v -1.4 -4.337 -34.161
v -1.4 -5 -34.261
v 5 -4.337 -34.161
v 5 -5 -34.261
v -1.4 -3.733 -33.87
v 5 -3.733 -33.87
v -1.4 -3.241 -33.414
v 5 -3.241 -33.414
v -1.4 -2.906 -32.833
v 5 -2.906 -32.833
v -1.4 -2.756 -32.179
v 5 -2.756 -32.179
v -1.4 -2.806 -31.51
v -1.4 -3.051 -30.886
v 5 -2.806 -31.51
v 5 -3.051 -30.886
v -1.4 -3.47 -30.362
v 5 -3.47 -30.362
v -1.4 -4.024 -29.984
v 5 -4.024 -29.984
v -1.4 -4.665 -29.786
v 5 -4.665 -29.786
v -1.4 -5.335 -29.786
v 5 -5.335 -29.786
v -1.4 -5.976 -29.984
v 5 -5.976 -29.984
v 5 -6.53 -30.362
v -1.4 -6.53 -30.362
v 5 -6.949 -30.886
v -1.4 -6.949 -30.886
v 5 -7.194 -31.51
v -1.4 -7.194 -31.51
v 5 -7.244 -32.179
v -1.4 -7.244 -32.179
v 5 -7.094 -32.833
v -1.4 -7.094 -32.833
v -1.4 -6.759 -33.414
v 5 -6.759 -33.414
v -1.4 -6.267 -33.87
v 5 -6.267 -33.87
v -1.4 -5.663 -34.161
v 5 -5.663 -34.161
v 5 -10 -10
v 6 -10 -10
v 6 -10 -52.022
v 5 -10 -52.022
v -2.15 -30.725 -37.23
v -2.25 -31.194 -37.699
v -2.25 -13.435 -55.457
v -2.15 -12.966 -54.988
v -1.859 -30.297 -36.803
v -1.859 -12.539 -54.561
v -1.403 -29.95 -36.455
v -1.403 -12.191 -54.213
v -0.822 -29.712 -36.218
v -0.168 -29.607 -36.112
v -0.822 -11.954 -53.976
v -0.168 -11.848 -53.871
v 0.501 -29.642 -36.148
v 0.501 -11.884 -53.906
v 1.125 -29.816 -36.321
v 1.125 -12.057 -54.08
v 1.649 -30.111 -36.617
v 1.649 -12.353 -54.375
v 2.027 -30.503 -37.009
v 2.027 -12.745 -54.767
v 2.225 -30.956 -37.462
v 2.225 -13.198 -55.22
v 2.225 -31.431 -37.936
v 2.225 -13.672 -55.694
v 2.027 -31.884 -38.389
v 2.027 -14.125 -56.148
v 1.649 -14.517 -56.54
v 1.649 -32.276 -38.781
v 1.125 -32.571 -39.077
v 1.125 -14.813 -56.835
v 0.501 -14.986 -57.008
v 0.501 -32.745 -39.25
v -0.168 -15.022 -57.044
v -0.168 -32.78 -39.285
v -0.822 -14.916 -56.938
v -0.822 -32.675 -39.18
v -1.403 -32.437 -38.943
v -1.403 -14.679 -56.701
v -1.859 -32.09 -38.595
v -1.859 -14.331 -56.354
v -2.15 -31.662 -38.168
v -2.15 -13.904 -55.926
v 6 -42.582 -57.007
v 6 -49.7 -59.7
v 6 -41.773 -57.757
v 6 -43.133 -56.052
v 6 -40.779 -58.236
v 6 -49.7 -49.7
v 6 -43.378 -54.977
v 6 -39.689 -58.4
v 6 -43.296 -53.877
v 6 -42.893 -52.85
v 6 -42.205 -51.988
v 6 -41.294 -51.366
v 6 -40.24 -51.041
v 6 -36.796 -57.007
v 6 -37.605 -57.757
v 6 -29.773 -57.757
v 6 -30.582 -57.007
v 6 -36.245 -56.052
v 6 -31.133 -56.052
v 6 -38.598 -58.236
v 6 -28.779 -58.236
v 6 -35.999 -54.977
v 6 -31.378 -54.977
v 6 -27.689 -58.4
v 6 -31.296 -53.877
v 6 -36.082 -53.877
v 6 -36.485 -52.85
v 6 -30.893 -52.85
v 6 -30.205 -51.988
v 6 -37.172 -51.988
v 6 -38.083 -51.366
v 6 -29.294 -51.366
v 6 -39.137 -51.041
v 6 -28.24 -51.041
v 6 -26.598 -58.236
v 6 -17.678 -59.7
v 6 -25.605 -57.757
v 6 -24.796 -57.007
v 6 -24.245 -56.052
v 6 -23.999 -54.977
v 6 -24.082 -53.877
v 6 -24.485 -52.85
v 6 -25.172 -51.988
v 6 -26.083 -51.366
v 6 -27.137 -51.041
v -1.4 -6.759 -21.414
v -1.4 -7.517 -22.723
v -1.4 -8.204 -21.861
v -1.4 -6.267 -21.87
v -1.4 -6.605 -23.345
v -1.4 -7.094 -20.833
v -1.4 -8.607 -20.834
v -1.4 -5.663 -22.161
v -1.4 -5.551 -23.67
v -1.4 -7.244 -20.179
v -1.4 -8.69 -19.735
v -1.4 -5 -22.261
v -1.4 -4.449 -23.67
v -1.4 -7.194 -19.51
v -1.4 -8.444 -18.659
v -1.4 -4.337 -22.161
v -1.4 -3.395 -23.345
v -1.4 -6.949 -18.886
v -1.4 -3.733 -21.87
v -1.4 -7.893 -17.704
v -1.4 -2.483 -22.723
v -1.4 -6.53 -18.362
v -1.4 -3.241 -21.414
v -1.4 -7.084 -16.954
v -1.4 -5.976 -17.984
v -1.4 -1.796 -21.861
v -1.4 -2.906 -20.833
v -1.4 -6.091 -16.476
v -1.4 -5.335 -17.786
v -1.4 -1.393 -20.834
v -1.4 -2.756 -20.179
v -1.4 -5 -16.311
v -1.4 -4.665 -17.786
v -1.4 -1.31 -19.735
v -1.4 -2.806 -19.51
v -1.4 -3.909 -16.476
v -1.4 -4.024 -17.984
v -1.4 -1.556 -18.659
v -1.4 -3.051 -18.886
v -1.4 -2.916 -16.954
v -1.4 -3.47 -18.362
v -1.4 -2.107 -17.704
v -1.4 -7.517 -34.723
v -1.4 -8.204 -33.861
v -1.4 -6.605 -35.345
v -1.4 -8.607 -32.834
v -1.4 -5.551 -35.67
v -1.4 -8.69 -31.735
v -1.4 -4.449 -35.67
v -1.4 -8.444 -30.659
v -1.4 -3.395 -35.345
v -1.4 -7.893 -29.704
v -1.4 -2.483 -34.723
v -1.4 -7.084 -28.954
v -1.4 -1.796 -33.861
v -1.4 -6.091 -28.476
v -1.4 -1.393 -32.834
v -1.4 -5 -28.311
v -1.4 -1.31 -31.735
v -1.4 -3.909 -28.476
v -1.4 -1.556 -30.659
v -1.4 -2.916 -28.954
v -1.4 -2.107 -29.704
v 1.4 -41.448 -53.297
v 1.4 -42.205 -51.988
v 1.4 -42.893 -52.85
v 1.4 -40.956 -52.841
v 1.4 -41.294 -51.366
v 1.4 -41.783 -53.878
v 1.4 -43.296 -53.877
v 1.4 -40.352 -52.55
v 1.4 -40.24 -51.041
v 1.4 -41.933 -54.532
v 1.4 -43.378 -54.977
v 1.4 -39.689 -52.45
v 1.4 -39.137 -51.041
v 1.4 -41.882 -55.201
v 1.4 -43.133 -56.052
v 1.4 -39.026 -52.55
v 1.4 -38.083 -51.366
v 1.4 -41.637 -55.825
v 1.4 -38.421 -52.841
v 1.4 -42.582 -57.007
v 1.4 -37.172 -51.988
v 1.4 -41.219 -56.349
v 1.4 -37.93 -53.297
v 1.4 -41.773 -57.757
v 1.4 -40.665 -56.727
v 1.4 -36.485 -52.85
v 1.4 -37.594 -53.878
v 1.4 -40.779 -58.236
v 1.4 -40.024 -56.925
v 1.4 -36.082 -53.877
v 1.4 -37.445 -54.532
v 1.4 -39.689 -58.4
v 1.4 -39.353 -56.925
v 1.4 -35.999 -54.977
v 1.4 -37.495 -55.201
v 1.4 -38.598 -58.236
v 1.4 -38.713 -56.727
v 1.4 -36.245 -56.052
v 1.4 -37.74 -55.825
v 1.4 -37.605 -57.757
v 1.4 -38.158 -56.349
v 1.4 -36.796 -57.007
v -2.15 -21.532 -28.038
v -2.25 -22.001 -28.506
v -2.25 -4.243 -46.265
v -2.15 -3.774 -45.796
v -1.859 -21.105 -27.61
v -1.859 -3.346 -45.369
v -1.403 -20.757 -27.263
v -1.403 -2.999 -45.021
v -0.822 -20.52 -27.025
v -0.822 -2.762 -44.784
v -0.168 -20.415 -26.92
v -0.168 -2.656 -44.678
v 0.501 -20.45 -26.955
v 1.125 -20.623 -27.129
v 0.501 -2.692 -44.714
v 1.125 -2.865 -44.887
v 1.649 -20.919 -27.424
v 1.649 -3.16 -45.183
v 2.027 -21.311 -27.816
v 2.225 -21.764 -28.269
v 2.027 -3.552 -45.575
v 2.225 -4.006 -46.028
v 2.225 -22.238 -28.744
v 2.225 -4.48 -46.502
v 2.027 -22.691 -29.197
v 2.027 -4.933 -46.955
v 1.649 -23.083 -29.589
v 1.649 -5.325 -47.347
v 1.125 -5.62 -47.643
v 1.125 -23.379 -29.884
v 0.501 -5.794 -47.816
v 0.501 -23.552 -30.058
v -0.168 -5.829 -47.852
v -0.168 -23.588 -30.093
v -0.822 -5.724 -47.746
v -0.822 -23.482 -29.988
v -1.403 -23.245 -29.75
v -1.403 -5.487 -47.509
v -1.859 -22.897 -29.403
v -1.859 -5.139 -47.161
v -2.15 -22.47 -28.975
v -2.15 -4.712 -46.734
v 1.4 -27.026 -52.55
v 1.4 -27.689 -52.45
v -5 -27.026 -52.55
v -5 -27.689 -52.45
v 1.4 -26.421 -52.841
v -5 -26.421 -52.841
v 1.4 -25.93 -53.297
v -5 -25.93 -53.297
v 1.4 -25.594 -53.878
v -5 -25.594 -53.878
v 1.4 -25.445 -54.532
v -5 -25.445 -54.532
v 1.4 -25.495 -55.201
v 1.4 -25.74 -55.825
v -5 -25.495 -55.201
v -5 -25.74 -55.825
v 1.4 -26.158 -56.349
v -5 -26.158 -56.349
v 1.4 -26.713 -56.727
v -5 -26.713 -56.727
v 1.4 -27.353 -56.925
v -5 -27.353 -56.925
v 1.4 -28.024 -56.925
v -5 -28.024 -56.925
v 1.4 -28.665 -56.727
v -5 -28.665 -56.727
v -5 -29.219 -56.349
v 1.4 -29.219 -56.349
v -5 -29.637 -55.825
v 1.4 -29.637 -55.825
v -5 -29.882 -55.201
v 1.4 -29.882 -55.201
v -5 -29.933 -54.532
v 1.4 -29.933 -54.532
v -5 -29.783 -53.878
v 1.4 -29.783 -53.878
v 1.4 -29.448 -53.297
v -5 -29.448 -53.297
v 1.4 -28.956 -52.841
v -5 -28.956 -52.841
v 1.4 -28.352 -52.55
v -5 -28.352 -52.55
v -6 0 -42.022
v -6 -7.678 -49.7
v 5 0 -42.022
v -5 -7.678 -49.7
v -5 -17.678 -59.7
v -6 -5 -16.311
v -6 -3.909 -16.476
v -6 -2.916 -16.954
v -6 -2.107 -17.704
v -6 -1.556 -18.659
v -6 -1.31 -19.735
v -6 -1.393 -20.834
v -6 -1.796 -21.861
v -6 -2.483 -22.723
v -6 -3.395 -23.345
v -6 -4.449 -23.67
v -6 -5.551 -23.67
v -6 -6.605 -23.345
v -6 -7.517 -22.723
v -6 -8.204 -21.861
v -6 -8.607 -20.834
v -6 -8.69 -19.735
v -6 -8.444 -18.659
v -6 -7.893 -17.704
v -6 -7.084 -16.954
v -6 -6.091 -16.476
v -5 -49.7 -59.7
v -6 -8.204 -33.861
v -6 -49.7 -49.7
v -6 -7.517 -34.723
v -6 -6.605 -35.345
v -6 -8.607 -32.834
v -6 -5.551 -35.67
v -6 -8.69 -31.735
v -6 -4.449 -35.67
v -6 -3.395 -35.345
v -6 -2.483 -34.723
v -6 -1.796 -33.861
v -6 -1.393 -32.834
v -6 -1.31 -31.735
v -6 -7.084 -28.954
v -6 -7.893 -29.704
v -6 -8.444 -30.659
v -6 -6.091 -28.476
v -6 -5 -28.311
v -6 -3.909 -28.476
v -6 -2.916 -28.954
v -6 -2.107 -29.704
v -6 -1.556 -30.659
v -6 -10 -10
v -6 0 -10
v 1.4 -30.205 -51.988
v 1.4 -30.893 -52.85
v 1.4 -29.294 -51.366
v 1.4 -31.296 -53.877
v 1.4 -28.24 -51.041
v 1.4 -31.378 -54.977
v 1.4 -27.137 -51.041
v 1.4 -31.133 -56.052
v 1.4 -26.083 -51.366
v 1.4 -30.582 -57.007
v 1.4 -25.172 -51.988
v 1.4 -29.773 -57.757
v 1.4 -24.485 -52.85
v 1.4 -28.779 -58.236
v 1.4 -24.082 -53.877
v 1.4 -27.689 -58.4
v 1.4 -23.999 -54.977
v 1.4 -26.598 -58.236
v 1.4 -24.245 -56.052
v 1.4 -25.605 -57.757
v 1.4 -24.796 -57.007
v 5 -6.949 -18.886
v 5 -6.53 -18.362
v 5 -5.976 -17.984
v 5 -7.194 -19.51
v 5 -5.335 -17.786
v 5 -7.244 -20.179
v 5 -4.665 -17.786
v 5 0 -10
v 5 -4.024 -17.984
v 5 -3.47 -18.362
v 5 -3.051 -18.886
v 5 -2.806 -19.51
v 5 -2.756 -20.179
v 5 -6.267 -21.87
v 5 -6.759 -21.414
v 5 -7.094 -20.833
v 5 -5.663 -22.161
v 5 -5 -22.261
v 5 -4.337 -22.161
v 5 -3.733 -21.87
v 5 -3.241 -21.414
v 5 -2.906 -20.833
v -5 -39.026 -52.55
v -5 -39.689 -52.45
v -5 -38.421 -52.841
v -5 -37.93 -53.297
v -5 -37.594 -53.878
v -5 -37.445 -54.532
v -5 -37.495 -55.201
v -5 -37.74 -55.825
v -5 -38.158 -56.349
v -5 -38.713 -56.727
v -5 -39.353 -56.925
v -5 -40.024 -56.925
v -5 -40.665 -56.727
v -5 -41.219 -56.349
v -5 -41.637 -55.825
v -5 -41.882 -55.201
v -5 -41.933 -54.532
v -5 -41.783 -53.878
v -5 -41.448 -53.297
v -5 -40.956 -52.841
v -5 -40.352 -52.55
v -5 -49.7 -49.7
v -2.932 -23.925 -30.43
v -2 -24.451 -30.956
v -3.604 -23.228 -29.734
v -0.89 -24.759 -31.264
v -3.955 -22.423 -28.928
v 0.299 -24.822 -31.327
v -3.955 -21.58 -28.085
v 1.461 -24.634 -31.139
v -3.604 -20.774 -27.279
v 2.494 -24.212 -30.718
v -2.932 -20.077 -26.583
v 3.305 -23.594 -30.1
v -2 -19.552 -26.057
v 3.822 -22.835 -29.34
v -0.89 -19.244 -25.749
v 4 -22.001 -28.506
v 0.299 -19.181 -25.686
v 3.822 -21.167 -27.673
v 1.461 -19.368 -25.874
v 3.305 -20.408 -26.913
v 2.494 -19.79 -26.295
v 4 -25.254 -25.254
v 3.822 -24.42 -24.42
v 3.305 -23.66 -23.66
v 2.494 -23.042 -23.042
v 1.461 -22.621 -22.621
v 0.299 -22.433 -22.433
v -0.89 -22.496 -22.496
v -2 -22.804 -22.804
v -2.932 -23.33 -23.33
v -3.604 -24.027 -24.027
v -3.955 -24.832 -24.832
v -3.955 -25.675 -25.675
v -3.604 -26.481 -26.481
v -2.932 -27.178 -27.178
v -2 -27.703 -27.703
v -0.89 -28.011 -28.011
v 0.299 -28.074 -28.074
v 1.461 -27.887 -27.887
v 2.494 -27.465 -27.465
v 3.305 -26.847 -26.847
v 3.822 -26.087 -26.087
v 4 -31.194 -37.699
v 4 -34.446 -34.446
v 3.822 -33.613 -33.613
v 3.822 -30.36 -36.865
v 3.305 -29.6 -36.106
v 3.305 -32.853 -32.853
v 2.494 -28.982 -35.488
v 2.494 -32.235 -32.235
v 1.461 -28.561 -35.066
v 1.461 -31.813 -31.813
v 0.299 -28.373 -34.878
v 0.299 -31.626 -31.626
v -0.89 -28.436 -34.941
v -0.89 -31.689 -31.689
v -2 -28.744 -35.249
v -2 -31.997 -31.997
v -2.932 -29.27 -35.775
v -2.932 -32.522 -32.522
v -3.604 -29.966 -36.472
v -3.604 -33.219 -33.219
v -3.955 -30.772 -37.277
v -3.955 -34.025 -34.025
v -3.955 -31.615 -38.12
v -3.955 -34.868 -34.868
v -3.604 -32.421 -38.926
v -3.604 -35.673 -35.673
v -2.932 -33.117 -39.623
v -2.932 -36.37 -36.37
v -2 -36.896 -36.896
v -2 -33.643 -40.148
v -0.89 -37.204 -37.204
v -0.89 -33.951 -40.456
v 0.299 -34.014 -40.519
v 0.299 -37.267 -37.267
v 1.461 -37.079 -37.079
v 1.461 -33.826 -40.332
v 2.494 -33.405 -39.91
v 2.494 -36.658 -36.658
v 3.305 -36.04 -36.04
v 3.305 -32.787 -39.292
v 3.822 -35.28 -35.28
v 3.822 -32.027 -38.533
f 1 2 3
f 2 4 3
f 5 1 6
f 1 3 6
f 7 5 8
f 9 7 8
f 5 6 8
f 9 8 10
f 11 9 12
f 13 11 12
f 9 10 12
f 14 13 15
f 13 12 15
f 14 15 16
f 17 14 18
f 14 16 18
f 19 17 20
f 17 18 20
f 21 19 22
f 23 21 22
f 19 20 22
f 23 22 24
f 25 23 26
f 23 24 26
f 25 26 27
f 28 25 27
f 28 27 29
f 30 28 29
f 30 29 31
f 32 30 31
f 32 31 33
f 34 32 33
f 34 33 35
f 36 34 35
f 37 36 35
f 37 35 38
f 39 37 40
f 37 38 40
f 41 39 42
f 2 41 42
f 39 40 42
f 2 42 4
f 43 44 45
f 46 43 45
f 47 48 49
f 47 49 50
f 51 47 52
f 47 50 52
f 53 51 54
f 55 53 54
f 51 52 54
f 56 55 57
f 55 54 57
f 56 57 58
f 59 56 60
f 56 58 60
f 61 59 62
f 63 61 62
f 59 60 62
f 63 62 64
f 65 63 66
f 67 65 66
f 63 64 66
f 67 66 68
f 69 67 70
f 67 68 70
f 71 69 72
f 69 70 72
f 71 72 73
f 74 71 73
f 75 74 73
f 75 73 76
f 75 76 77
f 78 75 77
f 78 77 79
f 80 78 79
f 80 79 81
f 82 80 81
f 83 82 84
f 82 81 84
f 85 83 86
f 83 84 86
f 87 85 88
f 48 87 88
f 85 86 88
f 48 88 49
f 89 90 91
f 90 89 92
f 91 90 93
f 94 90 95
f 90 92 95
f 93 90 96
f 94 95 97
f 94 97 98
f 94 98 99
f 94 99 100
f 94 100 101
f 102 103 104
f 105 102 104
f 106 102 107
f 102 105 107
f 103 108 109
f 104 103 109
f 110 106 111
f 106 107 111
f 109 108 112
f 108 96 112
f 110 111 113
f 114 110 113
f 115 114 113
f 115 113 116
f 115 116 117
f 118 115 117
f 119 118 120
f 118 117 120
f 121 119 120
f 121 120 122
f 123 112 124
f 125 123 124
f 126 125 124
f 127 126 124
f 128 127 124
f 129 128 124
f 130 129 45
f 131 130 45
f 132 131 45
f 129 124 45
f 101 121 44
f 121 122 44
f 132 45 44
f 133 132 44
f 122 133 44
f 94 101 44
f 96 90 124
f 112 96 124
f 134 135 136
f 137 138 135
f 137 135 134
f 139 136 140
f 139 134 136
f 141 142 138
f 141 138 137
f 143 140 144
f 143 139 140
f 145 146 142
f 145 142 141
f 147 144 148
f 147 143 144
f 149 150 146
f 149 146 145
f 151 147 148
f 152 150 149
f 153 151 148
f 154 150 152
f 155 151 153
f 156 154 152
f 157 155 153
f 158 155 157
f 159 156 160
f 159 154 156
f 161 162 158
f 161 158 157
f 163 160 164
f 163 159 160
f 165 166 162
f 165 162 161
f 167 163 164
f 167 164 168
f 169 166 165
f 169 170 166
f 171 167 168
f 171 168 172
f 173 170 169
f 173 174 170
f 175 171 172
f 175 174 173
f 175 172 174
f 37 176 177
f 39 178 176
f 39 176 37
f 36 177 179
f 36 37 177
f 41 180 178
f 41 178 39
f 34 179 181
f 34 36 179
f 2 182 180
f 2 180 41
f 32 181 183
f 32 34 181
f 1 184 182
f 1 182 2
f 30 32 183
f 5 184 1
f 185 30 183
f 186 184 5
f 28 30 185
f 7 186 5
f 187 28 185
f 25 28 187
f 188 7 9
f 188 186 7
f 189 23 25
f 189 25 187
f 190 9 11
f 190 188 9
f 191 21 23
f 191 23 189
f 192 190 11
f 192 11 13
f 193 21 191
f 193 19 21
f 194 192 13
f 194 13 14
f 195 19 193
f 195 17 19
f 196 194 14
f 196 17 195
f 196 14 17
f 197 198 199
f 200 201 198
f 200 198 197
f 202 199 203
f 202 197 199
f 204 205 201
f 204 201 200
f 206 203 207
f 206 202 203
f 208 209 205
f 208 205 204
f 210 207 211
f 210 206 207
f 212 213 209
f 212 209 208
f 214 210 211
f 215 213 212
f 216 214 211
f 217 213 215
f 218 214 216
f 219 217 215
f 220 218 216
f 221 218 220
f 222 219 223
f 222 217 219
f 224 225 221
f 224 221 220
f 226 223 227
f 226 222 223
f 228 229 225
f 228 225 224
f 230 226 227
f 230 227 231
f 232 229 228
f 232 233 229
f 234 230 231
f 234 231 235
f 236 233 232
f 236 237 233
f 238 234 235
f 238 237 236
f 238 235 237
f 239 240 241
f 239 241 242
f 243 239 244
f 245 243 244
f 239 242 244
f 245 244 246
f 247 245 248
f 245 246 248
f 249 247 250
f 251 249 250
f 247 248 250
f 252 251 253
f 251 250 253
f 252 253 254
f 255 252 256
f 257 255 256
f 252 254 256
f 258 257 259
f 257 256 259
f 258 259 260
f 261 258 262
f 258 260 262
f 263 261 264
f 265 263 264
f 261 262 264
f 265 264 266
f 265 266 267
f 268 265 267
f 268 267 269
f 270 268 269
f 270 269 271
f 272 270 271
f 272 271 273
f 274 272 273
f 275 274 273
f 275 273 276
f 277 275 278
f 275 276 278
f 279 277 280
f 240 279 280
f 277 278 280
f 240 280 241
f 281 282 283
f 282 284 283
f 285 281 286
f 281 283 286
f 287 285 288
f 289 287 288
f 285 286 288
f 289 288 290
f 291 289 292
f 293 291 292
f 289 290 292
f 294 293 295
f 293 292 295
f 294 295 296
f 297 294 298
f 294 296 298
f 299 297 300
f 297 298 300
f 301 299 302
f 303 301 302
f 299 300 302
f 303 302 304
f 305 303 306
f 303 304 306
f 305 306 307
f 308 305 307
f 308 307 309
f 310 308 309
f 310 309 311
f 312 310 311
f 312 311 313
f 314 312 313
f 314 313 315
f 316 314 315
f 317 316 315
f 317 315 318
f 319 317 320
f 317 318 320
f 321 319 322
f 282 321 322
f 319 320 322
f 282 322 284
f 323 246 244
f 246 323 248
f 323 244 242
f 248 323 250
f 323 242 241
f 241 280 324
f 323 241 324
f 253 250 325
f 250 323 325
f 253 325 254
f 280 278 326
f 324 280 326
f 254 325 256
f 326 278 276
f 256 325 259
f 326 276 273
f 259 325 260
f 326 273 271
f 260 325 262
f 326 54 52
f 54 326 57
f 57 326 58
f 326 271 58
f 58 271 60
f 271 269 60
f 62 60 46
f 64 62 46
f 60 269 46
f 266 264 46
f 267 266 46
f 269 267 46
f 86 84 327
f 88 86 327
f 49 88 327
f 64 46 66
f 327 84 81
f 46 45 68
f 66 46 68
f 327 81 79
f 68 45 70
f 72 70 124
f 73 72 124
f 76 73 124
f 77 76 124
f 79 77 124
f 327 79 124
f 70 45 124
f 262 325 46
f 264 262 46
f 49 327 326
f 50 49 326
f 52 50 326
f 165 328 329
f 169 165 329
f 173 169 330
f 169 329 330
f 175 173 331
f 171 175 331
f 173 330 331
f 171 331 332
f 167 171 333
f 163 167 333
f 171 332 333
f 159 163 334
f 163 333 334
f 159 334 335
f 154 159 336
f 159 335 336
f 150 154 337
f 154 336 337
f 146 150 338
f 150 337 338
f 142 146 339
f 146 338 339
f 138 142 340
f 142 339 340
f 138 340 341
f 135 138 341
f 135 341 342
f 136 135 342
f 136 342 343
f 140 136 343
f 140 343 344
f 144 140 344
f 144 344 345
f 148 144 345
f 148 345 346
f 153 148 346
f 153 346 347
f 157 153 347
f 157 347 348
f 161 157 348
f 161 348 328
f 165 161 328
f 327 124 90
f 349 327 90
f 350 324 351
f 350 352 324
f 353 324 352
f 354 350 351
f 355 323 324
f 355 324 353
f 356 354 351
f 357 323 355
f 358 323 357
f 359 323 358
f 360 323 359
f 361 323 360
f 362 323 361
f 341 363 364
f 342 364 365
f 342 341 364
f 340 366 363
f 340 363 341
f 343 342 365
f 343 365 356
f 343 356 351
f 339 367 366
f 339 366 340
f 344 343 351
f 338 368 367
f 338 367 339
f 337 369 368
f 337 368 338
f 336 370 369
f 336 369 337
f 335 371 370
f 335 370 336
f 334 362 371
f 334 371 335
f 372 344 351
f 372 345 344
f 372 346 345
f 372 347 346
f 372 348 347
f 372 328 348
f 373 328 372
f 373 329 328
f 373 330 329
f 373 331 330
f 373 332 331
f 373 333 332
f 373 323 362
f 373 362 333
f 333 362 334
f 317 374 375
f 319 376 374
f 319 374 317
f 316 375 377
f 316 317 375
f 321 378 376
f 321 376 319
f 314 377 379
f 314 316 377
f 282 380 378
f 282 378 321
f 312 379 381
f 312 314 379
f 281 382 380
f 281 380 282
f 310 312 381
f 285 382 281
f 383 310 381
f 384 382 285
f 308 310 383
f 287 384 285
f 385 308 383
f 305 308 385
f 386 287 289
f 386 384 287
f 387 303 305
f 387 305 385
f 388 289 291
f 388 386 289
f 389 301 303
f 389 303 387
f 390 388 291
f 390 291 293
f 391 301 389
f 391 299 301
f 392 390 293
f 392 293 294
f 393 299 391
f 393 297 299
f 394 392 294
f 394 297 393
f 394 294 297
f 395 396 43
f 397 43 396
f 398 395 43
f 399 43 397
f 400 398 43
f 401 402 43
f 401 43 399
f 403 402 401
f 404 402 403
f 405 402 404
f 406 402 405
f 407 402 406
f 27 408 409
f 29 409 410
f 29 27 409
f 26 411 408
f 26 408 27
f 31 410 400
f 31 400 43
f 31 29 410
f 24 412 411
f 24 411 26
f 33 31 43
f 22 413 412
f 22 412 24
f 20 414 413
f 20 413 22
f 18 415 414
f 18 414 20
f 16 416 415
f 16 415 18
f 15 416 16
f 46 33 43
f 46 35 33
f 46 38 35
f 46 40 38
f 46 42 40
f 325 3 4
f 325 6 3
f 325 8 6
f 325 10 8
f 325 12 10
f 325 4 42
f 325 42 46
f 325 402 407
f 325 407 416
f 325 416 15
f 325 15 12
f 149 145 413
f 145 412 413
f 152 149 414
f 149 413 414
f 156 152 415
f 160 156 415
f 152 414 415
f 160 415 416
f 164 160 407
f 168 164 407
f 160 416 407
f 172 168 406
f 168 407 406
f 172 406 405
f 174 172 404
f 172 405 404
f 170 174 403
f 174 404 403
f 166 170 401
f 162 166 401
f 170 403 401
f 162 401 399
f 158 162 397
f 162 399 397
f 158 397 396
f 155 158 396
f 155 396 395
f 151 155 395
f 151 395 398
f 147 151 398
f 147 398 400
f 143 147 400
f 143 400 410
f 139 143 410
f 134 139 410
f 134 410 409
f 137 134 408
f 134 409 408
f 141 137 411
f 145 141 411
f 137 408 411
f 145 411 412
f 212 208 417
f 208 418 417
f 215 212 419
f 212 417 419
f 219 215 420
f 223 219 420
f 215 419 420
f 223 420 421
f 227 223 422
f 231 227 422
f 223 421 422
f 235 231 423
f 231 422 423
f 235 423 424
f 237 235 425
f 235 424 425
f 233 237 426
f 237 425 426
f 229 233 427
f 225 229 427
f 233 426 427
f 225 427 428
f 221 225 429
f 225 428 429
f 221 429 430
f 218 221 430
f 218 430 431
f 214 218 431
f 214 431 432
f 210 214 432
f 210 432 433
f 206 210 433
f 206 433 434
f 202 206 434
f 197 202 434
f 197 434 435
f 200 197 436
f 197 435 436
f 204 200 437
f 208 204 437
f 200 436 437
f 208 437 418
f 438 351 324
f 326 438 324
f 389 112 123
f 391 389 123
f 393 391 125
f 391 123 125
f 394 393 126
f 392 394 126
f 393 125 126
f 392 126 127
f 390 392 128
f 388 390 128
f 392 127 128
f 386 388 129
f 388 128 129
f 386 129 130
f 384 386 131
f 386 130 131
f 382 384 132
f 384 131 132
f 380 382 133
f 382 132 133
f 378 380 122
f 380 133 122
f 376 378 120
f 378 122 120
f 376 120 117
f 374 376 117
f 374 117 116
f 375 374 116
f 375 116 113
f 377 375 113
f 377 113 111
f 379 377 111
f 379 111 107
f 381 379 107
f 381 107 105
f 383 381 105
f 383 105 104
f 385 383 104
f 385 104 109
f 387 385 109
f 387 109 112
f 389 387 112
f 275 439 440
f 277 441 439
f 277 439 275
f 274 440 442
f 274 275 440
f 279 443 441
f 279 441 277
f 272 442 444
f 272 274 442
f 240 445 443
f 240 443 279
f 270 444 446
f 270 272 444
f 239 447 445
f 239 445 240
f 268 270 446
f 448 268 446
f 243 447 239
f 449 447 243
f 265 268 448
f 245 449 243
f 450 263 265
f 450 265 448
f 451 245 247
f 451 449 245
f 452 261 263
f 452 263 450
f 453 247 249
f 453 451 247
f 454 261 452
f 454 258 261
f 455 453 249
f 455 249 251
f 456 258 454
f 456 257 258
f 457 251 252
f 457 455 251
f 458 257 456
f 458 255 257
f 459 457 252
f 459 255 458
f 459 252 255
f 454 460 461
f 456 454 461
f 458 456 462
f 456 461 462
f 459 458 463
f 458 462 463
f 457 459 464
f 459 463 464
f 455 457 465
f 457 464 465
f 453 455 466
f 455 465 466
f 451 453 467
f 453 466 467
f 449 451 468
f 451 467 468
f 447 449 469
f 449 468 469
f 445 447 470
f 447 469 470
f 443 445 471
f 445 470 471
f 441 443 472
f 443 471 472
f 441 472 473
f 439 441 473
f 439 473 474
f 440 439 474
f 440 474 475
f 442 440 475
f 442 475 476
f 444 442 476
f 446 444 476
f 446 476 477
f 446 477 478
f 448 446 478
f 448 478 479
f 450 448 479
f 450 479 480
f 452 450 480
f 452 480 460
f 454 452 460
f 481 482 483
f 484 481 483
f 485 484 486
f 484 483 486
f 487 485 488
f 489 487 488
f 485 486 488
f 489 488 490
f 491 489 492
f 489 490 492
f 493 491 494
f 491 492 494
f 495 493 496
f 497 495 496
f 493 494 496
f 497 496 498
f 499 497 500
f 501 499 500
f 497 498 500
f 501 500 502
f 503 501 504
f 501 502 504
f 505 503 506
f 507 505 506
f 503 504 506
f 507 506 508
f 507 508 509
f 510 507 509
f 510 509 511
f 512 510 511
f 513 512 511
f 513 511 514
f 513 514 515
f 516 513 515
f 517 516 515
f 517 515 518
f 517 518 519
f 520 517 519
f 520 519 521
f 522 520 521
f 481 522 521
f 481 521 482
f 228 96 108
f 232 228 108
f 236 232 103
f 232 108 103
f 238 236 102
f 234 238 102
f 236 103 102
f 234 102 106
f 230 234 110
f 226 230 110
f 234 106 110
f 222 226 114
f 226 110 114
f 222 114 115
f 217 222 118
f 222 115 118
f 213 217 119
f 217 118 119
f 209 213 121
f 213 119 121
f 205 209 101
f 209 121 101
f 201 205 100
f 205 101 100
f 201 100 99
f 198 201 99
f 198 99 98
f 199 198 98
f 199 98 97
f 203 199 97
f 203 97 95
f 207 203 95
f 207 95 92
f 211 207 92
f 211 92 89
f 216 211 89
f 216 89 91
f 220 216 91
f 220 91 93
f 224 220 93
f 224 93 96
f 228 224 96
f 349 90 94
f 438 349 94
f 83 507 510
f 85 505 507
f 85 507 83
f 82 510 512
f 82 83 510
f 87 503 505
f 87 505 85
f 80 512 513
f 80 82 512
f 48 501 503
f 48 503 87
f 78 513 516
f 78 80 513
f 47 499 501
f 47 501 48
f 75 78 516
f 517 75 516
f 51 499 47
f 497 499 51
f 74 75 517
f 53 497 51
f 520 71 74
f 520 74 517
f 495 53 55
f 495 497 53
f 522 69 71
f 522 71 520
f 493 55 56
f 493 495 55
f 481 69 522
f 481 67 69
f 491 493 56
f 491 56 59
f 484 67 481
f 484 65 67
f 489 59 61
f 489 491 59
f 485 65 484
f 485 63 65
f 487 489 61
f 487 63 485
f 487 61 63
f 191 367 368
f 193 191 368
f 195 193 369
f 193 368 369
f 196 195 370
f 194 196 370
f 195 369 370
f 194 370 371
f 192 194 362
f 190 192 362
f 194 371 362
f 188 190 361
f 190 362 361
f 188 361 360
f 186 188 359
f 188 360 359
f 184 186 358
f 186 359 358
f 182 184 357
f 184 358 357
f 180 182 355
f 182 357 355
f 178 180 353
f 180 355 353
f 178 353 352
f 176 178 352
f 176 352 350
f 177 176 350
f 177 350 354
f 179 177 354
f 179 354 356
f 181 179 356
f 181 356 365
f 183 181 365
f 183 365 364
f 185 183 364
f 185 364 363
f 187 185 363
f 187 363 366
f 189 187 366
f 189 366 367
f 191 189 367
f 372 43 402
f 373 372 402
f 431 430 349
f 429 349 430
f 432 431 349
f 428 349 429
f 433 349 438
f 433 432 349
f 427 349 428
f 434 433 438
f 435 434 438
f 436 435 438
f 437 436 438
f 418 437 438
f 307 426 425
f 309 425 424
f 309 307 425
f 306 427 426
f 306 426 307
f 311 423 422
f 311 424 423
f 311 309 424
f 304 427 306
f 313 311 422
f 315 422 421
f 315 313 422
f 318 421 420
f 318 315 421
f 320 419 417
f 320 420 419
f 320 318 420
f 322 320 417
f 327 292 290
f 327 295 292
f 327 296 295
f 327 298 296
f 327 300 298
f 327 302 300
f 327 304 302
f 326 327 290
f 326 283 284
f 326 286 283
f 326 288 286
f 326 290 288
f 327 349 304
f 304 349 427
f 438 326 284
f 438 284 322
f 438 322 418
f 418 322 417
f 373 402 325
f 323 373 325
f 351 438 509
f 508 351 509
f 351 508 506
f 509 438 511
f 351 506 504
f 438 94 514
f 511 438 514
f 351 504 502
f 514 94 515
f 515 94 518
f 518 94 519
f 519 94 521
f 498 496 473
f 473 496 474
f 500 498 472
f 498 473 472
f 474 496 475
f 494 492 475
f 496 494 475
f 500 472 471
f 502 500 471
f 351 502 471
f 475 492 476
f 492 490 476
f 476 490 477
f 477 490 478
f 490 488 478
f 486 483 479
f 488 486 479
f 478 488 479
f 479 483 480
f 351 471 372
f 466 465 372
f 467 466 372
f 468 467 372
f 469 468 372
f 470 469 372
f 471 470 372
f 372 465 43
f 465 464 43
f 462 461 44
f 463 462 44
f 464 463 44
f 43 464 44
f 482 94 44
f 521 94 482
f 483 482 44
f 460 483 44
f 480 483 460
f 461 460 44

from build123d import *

# Parameters (mm, degrees)
EXTRUDE_1_DEPTH             = 6
HOLE_WIZARD_3_D             = 4.5
HOLE_WIZARD_3_CBORE_D       = 8
HOLE_WIZARD_3_CBORE_DEPTH   = 4.6
CUT_EXTRUDE_1_DEPTH         = 1
CUT_EXTRUDE_2_DEPTH         = 1
HOLE_WIZARD_2_D             = 4.5
HOLE_WIZARD_2_CBORE_D       = 7.4
HOLE_WIZARD_2_CBORE_DEPTH   = 4.6
HOLE_WIZARD_3_2_D           = 4.5
HOLE_WIZARD_3_2_CBORE_D     = 7.4
HOLE_WIZARD_3_2_CBORE_DEPTH = 4.6
CUT_EXTRUDE_3_DEPTH         = 86.277077811


with BuildPart() as part:
    # 草图1 → 凸台-拉伸1 (new, symmetric)
    with BuildSketch(Plane(origin=(0, 0, 0), x_dir=(0, 0, -1), z_dir=(1, 0, 0))):
        Polygon((0, 0), (42.02233047, 0), (59.7, -17.67766953), (59.7, -59.7), align=None)
    extrude(amount=EXTRUDE_1_DEPTH, both=True)

    # Hole Wizard 3 (through all)
    with Locations(Plane(origin=(0, 0, 0), x_dir=(1, 0, 0), z_dir=(0, -0.7071067811865477, 0.7071067811865475))):
        with Locations((0, -35.714274837), (0, -48.714274837)):
            CounterBoreHole(HOLE_WIZARD_3_D / 2, HOLE_WIZARD_3_CBORE_D / 2, HOLE_WIZARD_3_CBORE_DEPTH)

    # 草图10 → 切除-拉伸1 (cut)
    with BuildSketch(Plane.ZY.offset(-6)):
        Polygon((-42.02233047, 0), (0, 0), (-10, -10), (-52.02233047, -10), align=None)
    extrude(amount=CUT_EXTRUDE_1_DEPTH, mode=Mode.SUBTRACT)

    # 草图11 → 切除-拉伸2 (cut)
    with BuildSketch(Plane.ZY.offset(6)):
        Polygon((-59.7, -17.67766953), (-59.7, -59.7), (-49.7, -49.7), (-49.7, -7.67766953), align=None)
    extrude(amount=-CUT_EXTRUDE_2_DEPTH, mode=Mode.SUBTRACT)

    # 打孔尺寸根据内六角圆柱头螺钉的类型2 (through all)
    with Locations(Plane.ZY.offset(6)):
        with Locations((-20.011165235, -5), (-32.011165235, -5)):
            CounterBoreHole(HOLE_WIZARD_2_D / 2, HOLE_WIZARD_2_CBORE_D / 2, HOLE_WIZARD_2_CBORE_DEPTH)

    # Hole Wizard 3 2 (through all)
    with Locations(Plane(origin=(6, 0, 0), x_dir=(0, 0, -1), z_dir=(1, 0, 0))):
        with Locations((54.7, -39.688834765), (54.7, -27.688834765)):
            CounterBoreHole(HOLE_WIZARD_3_2_D / 2, HOLE_WIZARD_3_2_CBORE_D / 2, HOLE_WIZARD_3_2_CBORE_DEPTH)

    # 草图16 → 切除-拉伸3 (cut, through all)
    with BuildSketch(Plane(origin=(6, 0, 0), x_dir=(0, 0, -1), z_dir=(1, 0, 0))):
        Polygon((10, -10), (10, 0), (0, 0), align=None)
        Polygon((59.7, -59.7), (59.7, -49.7), (49.7, -49.7), align=None)
    extrude(amount=-CUT_EXTRUDE_3_DEPTH, mode=Mode.SUBTRACT)


solid = part.part
